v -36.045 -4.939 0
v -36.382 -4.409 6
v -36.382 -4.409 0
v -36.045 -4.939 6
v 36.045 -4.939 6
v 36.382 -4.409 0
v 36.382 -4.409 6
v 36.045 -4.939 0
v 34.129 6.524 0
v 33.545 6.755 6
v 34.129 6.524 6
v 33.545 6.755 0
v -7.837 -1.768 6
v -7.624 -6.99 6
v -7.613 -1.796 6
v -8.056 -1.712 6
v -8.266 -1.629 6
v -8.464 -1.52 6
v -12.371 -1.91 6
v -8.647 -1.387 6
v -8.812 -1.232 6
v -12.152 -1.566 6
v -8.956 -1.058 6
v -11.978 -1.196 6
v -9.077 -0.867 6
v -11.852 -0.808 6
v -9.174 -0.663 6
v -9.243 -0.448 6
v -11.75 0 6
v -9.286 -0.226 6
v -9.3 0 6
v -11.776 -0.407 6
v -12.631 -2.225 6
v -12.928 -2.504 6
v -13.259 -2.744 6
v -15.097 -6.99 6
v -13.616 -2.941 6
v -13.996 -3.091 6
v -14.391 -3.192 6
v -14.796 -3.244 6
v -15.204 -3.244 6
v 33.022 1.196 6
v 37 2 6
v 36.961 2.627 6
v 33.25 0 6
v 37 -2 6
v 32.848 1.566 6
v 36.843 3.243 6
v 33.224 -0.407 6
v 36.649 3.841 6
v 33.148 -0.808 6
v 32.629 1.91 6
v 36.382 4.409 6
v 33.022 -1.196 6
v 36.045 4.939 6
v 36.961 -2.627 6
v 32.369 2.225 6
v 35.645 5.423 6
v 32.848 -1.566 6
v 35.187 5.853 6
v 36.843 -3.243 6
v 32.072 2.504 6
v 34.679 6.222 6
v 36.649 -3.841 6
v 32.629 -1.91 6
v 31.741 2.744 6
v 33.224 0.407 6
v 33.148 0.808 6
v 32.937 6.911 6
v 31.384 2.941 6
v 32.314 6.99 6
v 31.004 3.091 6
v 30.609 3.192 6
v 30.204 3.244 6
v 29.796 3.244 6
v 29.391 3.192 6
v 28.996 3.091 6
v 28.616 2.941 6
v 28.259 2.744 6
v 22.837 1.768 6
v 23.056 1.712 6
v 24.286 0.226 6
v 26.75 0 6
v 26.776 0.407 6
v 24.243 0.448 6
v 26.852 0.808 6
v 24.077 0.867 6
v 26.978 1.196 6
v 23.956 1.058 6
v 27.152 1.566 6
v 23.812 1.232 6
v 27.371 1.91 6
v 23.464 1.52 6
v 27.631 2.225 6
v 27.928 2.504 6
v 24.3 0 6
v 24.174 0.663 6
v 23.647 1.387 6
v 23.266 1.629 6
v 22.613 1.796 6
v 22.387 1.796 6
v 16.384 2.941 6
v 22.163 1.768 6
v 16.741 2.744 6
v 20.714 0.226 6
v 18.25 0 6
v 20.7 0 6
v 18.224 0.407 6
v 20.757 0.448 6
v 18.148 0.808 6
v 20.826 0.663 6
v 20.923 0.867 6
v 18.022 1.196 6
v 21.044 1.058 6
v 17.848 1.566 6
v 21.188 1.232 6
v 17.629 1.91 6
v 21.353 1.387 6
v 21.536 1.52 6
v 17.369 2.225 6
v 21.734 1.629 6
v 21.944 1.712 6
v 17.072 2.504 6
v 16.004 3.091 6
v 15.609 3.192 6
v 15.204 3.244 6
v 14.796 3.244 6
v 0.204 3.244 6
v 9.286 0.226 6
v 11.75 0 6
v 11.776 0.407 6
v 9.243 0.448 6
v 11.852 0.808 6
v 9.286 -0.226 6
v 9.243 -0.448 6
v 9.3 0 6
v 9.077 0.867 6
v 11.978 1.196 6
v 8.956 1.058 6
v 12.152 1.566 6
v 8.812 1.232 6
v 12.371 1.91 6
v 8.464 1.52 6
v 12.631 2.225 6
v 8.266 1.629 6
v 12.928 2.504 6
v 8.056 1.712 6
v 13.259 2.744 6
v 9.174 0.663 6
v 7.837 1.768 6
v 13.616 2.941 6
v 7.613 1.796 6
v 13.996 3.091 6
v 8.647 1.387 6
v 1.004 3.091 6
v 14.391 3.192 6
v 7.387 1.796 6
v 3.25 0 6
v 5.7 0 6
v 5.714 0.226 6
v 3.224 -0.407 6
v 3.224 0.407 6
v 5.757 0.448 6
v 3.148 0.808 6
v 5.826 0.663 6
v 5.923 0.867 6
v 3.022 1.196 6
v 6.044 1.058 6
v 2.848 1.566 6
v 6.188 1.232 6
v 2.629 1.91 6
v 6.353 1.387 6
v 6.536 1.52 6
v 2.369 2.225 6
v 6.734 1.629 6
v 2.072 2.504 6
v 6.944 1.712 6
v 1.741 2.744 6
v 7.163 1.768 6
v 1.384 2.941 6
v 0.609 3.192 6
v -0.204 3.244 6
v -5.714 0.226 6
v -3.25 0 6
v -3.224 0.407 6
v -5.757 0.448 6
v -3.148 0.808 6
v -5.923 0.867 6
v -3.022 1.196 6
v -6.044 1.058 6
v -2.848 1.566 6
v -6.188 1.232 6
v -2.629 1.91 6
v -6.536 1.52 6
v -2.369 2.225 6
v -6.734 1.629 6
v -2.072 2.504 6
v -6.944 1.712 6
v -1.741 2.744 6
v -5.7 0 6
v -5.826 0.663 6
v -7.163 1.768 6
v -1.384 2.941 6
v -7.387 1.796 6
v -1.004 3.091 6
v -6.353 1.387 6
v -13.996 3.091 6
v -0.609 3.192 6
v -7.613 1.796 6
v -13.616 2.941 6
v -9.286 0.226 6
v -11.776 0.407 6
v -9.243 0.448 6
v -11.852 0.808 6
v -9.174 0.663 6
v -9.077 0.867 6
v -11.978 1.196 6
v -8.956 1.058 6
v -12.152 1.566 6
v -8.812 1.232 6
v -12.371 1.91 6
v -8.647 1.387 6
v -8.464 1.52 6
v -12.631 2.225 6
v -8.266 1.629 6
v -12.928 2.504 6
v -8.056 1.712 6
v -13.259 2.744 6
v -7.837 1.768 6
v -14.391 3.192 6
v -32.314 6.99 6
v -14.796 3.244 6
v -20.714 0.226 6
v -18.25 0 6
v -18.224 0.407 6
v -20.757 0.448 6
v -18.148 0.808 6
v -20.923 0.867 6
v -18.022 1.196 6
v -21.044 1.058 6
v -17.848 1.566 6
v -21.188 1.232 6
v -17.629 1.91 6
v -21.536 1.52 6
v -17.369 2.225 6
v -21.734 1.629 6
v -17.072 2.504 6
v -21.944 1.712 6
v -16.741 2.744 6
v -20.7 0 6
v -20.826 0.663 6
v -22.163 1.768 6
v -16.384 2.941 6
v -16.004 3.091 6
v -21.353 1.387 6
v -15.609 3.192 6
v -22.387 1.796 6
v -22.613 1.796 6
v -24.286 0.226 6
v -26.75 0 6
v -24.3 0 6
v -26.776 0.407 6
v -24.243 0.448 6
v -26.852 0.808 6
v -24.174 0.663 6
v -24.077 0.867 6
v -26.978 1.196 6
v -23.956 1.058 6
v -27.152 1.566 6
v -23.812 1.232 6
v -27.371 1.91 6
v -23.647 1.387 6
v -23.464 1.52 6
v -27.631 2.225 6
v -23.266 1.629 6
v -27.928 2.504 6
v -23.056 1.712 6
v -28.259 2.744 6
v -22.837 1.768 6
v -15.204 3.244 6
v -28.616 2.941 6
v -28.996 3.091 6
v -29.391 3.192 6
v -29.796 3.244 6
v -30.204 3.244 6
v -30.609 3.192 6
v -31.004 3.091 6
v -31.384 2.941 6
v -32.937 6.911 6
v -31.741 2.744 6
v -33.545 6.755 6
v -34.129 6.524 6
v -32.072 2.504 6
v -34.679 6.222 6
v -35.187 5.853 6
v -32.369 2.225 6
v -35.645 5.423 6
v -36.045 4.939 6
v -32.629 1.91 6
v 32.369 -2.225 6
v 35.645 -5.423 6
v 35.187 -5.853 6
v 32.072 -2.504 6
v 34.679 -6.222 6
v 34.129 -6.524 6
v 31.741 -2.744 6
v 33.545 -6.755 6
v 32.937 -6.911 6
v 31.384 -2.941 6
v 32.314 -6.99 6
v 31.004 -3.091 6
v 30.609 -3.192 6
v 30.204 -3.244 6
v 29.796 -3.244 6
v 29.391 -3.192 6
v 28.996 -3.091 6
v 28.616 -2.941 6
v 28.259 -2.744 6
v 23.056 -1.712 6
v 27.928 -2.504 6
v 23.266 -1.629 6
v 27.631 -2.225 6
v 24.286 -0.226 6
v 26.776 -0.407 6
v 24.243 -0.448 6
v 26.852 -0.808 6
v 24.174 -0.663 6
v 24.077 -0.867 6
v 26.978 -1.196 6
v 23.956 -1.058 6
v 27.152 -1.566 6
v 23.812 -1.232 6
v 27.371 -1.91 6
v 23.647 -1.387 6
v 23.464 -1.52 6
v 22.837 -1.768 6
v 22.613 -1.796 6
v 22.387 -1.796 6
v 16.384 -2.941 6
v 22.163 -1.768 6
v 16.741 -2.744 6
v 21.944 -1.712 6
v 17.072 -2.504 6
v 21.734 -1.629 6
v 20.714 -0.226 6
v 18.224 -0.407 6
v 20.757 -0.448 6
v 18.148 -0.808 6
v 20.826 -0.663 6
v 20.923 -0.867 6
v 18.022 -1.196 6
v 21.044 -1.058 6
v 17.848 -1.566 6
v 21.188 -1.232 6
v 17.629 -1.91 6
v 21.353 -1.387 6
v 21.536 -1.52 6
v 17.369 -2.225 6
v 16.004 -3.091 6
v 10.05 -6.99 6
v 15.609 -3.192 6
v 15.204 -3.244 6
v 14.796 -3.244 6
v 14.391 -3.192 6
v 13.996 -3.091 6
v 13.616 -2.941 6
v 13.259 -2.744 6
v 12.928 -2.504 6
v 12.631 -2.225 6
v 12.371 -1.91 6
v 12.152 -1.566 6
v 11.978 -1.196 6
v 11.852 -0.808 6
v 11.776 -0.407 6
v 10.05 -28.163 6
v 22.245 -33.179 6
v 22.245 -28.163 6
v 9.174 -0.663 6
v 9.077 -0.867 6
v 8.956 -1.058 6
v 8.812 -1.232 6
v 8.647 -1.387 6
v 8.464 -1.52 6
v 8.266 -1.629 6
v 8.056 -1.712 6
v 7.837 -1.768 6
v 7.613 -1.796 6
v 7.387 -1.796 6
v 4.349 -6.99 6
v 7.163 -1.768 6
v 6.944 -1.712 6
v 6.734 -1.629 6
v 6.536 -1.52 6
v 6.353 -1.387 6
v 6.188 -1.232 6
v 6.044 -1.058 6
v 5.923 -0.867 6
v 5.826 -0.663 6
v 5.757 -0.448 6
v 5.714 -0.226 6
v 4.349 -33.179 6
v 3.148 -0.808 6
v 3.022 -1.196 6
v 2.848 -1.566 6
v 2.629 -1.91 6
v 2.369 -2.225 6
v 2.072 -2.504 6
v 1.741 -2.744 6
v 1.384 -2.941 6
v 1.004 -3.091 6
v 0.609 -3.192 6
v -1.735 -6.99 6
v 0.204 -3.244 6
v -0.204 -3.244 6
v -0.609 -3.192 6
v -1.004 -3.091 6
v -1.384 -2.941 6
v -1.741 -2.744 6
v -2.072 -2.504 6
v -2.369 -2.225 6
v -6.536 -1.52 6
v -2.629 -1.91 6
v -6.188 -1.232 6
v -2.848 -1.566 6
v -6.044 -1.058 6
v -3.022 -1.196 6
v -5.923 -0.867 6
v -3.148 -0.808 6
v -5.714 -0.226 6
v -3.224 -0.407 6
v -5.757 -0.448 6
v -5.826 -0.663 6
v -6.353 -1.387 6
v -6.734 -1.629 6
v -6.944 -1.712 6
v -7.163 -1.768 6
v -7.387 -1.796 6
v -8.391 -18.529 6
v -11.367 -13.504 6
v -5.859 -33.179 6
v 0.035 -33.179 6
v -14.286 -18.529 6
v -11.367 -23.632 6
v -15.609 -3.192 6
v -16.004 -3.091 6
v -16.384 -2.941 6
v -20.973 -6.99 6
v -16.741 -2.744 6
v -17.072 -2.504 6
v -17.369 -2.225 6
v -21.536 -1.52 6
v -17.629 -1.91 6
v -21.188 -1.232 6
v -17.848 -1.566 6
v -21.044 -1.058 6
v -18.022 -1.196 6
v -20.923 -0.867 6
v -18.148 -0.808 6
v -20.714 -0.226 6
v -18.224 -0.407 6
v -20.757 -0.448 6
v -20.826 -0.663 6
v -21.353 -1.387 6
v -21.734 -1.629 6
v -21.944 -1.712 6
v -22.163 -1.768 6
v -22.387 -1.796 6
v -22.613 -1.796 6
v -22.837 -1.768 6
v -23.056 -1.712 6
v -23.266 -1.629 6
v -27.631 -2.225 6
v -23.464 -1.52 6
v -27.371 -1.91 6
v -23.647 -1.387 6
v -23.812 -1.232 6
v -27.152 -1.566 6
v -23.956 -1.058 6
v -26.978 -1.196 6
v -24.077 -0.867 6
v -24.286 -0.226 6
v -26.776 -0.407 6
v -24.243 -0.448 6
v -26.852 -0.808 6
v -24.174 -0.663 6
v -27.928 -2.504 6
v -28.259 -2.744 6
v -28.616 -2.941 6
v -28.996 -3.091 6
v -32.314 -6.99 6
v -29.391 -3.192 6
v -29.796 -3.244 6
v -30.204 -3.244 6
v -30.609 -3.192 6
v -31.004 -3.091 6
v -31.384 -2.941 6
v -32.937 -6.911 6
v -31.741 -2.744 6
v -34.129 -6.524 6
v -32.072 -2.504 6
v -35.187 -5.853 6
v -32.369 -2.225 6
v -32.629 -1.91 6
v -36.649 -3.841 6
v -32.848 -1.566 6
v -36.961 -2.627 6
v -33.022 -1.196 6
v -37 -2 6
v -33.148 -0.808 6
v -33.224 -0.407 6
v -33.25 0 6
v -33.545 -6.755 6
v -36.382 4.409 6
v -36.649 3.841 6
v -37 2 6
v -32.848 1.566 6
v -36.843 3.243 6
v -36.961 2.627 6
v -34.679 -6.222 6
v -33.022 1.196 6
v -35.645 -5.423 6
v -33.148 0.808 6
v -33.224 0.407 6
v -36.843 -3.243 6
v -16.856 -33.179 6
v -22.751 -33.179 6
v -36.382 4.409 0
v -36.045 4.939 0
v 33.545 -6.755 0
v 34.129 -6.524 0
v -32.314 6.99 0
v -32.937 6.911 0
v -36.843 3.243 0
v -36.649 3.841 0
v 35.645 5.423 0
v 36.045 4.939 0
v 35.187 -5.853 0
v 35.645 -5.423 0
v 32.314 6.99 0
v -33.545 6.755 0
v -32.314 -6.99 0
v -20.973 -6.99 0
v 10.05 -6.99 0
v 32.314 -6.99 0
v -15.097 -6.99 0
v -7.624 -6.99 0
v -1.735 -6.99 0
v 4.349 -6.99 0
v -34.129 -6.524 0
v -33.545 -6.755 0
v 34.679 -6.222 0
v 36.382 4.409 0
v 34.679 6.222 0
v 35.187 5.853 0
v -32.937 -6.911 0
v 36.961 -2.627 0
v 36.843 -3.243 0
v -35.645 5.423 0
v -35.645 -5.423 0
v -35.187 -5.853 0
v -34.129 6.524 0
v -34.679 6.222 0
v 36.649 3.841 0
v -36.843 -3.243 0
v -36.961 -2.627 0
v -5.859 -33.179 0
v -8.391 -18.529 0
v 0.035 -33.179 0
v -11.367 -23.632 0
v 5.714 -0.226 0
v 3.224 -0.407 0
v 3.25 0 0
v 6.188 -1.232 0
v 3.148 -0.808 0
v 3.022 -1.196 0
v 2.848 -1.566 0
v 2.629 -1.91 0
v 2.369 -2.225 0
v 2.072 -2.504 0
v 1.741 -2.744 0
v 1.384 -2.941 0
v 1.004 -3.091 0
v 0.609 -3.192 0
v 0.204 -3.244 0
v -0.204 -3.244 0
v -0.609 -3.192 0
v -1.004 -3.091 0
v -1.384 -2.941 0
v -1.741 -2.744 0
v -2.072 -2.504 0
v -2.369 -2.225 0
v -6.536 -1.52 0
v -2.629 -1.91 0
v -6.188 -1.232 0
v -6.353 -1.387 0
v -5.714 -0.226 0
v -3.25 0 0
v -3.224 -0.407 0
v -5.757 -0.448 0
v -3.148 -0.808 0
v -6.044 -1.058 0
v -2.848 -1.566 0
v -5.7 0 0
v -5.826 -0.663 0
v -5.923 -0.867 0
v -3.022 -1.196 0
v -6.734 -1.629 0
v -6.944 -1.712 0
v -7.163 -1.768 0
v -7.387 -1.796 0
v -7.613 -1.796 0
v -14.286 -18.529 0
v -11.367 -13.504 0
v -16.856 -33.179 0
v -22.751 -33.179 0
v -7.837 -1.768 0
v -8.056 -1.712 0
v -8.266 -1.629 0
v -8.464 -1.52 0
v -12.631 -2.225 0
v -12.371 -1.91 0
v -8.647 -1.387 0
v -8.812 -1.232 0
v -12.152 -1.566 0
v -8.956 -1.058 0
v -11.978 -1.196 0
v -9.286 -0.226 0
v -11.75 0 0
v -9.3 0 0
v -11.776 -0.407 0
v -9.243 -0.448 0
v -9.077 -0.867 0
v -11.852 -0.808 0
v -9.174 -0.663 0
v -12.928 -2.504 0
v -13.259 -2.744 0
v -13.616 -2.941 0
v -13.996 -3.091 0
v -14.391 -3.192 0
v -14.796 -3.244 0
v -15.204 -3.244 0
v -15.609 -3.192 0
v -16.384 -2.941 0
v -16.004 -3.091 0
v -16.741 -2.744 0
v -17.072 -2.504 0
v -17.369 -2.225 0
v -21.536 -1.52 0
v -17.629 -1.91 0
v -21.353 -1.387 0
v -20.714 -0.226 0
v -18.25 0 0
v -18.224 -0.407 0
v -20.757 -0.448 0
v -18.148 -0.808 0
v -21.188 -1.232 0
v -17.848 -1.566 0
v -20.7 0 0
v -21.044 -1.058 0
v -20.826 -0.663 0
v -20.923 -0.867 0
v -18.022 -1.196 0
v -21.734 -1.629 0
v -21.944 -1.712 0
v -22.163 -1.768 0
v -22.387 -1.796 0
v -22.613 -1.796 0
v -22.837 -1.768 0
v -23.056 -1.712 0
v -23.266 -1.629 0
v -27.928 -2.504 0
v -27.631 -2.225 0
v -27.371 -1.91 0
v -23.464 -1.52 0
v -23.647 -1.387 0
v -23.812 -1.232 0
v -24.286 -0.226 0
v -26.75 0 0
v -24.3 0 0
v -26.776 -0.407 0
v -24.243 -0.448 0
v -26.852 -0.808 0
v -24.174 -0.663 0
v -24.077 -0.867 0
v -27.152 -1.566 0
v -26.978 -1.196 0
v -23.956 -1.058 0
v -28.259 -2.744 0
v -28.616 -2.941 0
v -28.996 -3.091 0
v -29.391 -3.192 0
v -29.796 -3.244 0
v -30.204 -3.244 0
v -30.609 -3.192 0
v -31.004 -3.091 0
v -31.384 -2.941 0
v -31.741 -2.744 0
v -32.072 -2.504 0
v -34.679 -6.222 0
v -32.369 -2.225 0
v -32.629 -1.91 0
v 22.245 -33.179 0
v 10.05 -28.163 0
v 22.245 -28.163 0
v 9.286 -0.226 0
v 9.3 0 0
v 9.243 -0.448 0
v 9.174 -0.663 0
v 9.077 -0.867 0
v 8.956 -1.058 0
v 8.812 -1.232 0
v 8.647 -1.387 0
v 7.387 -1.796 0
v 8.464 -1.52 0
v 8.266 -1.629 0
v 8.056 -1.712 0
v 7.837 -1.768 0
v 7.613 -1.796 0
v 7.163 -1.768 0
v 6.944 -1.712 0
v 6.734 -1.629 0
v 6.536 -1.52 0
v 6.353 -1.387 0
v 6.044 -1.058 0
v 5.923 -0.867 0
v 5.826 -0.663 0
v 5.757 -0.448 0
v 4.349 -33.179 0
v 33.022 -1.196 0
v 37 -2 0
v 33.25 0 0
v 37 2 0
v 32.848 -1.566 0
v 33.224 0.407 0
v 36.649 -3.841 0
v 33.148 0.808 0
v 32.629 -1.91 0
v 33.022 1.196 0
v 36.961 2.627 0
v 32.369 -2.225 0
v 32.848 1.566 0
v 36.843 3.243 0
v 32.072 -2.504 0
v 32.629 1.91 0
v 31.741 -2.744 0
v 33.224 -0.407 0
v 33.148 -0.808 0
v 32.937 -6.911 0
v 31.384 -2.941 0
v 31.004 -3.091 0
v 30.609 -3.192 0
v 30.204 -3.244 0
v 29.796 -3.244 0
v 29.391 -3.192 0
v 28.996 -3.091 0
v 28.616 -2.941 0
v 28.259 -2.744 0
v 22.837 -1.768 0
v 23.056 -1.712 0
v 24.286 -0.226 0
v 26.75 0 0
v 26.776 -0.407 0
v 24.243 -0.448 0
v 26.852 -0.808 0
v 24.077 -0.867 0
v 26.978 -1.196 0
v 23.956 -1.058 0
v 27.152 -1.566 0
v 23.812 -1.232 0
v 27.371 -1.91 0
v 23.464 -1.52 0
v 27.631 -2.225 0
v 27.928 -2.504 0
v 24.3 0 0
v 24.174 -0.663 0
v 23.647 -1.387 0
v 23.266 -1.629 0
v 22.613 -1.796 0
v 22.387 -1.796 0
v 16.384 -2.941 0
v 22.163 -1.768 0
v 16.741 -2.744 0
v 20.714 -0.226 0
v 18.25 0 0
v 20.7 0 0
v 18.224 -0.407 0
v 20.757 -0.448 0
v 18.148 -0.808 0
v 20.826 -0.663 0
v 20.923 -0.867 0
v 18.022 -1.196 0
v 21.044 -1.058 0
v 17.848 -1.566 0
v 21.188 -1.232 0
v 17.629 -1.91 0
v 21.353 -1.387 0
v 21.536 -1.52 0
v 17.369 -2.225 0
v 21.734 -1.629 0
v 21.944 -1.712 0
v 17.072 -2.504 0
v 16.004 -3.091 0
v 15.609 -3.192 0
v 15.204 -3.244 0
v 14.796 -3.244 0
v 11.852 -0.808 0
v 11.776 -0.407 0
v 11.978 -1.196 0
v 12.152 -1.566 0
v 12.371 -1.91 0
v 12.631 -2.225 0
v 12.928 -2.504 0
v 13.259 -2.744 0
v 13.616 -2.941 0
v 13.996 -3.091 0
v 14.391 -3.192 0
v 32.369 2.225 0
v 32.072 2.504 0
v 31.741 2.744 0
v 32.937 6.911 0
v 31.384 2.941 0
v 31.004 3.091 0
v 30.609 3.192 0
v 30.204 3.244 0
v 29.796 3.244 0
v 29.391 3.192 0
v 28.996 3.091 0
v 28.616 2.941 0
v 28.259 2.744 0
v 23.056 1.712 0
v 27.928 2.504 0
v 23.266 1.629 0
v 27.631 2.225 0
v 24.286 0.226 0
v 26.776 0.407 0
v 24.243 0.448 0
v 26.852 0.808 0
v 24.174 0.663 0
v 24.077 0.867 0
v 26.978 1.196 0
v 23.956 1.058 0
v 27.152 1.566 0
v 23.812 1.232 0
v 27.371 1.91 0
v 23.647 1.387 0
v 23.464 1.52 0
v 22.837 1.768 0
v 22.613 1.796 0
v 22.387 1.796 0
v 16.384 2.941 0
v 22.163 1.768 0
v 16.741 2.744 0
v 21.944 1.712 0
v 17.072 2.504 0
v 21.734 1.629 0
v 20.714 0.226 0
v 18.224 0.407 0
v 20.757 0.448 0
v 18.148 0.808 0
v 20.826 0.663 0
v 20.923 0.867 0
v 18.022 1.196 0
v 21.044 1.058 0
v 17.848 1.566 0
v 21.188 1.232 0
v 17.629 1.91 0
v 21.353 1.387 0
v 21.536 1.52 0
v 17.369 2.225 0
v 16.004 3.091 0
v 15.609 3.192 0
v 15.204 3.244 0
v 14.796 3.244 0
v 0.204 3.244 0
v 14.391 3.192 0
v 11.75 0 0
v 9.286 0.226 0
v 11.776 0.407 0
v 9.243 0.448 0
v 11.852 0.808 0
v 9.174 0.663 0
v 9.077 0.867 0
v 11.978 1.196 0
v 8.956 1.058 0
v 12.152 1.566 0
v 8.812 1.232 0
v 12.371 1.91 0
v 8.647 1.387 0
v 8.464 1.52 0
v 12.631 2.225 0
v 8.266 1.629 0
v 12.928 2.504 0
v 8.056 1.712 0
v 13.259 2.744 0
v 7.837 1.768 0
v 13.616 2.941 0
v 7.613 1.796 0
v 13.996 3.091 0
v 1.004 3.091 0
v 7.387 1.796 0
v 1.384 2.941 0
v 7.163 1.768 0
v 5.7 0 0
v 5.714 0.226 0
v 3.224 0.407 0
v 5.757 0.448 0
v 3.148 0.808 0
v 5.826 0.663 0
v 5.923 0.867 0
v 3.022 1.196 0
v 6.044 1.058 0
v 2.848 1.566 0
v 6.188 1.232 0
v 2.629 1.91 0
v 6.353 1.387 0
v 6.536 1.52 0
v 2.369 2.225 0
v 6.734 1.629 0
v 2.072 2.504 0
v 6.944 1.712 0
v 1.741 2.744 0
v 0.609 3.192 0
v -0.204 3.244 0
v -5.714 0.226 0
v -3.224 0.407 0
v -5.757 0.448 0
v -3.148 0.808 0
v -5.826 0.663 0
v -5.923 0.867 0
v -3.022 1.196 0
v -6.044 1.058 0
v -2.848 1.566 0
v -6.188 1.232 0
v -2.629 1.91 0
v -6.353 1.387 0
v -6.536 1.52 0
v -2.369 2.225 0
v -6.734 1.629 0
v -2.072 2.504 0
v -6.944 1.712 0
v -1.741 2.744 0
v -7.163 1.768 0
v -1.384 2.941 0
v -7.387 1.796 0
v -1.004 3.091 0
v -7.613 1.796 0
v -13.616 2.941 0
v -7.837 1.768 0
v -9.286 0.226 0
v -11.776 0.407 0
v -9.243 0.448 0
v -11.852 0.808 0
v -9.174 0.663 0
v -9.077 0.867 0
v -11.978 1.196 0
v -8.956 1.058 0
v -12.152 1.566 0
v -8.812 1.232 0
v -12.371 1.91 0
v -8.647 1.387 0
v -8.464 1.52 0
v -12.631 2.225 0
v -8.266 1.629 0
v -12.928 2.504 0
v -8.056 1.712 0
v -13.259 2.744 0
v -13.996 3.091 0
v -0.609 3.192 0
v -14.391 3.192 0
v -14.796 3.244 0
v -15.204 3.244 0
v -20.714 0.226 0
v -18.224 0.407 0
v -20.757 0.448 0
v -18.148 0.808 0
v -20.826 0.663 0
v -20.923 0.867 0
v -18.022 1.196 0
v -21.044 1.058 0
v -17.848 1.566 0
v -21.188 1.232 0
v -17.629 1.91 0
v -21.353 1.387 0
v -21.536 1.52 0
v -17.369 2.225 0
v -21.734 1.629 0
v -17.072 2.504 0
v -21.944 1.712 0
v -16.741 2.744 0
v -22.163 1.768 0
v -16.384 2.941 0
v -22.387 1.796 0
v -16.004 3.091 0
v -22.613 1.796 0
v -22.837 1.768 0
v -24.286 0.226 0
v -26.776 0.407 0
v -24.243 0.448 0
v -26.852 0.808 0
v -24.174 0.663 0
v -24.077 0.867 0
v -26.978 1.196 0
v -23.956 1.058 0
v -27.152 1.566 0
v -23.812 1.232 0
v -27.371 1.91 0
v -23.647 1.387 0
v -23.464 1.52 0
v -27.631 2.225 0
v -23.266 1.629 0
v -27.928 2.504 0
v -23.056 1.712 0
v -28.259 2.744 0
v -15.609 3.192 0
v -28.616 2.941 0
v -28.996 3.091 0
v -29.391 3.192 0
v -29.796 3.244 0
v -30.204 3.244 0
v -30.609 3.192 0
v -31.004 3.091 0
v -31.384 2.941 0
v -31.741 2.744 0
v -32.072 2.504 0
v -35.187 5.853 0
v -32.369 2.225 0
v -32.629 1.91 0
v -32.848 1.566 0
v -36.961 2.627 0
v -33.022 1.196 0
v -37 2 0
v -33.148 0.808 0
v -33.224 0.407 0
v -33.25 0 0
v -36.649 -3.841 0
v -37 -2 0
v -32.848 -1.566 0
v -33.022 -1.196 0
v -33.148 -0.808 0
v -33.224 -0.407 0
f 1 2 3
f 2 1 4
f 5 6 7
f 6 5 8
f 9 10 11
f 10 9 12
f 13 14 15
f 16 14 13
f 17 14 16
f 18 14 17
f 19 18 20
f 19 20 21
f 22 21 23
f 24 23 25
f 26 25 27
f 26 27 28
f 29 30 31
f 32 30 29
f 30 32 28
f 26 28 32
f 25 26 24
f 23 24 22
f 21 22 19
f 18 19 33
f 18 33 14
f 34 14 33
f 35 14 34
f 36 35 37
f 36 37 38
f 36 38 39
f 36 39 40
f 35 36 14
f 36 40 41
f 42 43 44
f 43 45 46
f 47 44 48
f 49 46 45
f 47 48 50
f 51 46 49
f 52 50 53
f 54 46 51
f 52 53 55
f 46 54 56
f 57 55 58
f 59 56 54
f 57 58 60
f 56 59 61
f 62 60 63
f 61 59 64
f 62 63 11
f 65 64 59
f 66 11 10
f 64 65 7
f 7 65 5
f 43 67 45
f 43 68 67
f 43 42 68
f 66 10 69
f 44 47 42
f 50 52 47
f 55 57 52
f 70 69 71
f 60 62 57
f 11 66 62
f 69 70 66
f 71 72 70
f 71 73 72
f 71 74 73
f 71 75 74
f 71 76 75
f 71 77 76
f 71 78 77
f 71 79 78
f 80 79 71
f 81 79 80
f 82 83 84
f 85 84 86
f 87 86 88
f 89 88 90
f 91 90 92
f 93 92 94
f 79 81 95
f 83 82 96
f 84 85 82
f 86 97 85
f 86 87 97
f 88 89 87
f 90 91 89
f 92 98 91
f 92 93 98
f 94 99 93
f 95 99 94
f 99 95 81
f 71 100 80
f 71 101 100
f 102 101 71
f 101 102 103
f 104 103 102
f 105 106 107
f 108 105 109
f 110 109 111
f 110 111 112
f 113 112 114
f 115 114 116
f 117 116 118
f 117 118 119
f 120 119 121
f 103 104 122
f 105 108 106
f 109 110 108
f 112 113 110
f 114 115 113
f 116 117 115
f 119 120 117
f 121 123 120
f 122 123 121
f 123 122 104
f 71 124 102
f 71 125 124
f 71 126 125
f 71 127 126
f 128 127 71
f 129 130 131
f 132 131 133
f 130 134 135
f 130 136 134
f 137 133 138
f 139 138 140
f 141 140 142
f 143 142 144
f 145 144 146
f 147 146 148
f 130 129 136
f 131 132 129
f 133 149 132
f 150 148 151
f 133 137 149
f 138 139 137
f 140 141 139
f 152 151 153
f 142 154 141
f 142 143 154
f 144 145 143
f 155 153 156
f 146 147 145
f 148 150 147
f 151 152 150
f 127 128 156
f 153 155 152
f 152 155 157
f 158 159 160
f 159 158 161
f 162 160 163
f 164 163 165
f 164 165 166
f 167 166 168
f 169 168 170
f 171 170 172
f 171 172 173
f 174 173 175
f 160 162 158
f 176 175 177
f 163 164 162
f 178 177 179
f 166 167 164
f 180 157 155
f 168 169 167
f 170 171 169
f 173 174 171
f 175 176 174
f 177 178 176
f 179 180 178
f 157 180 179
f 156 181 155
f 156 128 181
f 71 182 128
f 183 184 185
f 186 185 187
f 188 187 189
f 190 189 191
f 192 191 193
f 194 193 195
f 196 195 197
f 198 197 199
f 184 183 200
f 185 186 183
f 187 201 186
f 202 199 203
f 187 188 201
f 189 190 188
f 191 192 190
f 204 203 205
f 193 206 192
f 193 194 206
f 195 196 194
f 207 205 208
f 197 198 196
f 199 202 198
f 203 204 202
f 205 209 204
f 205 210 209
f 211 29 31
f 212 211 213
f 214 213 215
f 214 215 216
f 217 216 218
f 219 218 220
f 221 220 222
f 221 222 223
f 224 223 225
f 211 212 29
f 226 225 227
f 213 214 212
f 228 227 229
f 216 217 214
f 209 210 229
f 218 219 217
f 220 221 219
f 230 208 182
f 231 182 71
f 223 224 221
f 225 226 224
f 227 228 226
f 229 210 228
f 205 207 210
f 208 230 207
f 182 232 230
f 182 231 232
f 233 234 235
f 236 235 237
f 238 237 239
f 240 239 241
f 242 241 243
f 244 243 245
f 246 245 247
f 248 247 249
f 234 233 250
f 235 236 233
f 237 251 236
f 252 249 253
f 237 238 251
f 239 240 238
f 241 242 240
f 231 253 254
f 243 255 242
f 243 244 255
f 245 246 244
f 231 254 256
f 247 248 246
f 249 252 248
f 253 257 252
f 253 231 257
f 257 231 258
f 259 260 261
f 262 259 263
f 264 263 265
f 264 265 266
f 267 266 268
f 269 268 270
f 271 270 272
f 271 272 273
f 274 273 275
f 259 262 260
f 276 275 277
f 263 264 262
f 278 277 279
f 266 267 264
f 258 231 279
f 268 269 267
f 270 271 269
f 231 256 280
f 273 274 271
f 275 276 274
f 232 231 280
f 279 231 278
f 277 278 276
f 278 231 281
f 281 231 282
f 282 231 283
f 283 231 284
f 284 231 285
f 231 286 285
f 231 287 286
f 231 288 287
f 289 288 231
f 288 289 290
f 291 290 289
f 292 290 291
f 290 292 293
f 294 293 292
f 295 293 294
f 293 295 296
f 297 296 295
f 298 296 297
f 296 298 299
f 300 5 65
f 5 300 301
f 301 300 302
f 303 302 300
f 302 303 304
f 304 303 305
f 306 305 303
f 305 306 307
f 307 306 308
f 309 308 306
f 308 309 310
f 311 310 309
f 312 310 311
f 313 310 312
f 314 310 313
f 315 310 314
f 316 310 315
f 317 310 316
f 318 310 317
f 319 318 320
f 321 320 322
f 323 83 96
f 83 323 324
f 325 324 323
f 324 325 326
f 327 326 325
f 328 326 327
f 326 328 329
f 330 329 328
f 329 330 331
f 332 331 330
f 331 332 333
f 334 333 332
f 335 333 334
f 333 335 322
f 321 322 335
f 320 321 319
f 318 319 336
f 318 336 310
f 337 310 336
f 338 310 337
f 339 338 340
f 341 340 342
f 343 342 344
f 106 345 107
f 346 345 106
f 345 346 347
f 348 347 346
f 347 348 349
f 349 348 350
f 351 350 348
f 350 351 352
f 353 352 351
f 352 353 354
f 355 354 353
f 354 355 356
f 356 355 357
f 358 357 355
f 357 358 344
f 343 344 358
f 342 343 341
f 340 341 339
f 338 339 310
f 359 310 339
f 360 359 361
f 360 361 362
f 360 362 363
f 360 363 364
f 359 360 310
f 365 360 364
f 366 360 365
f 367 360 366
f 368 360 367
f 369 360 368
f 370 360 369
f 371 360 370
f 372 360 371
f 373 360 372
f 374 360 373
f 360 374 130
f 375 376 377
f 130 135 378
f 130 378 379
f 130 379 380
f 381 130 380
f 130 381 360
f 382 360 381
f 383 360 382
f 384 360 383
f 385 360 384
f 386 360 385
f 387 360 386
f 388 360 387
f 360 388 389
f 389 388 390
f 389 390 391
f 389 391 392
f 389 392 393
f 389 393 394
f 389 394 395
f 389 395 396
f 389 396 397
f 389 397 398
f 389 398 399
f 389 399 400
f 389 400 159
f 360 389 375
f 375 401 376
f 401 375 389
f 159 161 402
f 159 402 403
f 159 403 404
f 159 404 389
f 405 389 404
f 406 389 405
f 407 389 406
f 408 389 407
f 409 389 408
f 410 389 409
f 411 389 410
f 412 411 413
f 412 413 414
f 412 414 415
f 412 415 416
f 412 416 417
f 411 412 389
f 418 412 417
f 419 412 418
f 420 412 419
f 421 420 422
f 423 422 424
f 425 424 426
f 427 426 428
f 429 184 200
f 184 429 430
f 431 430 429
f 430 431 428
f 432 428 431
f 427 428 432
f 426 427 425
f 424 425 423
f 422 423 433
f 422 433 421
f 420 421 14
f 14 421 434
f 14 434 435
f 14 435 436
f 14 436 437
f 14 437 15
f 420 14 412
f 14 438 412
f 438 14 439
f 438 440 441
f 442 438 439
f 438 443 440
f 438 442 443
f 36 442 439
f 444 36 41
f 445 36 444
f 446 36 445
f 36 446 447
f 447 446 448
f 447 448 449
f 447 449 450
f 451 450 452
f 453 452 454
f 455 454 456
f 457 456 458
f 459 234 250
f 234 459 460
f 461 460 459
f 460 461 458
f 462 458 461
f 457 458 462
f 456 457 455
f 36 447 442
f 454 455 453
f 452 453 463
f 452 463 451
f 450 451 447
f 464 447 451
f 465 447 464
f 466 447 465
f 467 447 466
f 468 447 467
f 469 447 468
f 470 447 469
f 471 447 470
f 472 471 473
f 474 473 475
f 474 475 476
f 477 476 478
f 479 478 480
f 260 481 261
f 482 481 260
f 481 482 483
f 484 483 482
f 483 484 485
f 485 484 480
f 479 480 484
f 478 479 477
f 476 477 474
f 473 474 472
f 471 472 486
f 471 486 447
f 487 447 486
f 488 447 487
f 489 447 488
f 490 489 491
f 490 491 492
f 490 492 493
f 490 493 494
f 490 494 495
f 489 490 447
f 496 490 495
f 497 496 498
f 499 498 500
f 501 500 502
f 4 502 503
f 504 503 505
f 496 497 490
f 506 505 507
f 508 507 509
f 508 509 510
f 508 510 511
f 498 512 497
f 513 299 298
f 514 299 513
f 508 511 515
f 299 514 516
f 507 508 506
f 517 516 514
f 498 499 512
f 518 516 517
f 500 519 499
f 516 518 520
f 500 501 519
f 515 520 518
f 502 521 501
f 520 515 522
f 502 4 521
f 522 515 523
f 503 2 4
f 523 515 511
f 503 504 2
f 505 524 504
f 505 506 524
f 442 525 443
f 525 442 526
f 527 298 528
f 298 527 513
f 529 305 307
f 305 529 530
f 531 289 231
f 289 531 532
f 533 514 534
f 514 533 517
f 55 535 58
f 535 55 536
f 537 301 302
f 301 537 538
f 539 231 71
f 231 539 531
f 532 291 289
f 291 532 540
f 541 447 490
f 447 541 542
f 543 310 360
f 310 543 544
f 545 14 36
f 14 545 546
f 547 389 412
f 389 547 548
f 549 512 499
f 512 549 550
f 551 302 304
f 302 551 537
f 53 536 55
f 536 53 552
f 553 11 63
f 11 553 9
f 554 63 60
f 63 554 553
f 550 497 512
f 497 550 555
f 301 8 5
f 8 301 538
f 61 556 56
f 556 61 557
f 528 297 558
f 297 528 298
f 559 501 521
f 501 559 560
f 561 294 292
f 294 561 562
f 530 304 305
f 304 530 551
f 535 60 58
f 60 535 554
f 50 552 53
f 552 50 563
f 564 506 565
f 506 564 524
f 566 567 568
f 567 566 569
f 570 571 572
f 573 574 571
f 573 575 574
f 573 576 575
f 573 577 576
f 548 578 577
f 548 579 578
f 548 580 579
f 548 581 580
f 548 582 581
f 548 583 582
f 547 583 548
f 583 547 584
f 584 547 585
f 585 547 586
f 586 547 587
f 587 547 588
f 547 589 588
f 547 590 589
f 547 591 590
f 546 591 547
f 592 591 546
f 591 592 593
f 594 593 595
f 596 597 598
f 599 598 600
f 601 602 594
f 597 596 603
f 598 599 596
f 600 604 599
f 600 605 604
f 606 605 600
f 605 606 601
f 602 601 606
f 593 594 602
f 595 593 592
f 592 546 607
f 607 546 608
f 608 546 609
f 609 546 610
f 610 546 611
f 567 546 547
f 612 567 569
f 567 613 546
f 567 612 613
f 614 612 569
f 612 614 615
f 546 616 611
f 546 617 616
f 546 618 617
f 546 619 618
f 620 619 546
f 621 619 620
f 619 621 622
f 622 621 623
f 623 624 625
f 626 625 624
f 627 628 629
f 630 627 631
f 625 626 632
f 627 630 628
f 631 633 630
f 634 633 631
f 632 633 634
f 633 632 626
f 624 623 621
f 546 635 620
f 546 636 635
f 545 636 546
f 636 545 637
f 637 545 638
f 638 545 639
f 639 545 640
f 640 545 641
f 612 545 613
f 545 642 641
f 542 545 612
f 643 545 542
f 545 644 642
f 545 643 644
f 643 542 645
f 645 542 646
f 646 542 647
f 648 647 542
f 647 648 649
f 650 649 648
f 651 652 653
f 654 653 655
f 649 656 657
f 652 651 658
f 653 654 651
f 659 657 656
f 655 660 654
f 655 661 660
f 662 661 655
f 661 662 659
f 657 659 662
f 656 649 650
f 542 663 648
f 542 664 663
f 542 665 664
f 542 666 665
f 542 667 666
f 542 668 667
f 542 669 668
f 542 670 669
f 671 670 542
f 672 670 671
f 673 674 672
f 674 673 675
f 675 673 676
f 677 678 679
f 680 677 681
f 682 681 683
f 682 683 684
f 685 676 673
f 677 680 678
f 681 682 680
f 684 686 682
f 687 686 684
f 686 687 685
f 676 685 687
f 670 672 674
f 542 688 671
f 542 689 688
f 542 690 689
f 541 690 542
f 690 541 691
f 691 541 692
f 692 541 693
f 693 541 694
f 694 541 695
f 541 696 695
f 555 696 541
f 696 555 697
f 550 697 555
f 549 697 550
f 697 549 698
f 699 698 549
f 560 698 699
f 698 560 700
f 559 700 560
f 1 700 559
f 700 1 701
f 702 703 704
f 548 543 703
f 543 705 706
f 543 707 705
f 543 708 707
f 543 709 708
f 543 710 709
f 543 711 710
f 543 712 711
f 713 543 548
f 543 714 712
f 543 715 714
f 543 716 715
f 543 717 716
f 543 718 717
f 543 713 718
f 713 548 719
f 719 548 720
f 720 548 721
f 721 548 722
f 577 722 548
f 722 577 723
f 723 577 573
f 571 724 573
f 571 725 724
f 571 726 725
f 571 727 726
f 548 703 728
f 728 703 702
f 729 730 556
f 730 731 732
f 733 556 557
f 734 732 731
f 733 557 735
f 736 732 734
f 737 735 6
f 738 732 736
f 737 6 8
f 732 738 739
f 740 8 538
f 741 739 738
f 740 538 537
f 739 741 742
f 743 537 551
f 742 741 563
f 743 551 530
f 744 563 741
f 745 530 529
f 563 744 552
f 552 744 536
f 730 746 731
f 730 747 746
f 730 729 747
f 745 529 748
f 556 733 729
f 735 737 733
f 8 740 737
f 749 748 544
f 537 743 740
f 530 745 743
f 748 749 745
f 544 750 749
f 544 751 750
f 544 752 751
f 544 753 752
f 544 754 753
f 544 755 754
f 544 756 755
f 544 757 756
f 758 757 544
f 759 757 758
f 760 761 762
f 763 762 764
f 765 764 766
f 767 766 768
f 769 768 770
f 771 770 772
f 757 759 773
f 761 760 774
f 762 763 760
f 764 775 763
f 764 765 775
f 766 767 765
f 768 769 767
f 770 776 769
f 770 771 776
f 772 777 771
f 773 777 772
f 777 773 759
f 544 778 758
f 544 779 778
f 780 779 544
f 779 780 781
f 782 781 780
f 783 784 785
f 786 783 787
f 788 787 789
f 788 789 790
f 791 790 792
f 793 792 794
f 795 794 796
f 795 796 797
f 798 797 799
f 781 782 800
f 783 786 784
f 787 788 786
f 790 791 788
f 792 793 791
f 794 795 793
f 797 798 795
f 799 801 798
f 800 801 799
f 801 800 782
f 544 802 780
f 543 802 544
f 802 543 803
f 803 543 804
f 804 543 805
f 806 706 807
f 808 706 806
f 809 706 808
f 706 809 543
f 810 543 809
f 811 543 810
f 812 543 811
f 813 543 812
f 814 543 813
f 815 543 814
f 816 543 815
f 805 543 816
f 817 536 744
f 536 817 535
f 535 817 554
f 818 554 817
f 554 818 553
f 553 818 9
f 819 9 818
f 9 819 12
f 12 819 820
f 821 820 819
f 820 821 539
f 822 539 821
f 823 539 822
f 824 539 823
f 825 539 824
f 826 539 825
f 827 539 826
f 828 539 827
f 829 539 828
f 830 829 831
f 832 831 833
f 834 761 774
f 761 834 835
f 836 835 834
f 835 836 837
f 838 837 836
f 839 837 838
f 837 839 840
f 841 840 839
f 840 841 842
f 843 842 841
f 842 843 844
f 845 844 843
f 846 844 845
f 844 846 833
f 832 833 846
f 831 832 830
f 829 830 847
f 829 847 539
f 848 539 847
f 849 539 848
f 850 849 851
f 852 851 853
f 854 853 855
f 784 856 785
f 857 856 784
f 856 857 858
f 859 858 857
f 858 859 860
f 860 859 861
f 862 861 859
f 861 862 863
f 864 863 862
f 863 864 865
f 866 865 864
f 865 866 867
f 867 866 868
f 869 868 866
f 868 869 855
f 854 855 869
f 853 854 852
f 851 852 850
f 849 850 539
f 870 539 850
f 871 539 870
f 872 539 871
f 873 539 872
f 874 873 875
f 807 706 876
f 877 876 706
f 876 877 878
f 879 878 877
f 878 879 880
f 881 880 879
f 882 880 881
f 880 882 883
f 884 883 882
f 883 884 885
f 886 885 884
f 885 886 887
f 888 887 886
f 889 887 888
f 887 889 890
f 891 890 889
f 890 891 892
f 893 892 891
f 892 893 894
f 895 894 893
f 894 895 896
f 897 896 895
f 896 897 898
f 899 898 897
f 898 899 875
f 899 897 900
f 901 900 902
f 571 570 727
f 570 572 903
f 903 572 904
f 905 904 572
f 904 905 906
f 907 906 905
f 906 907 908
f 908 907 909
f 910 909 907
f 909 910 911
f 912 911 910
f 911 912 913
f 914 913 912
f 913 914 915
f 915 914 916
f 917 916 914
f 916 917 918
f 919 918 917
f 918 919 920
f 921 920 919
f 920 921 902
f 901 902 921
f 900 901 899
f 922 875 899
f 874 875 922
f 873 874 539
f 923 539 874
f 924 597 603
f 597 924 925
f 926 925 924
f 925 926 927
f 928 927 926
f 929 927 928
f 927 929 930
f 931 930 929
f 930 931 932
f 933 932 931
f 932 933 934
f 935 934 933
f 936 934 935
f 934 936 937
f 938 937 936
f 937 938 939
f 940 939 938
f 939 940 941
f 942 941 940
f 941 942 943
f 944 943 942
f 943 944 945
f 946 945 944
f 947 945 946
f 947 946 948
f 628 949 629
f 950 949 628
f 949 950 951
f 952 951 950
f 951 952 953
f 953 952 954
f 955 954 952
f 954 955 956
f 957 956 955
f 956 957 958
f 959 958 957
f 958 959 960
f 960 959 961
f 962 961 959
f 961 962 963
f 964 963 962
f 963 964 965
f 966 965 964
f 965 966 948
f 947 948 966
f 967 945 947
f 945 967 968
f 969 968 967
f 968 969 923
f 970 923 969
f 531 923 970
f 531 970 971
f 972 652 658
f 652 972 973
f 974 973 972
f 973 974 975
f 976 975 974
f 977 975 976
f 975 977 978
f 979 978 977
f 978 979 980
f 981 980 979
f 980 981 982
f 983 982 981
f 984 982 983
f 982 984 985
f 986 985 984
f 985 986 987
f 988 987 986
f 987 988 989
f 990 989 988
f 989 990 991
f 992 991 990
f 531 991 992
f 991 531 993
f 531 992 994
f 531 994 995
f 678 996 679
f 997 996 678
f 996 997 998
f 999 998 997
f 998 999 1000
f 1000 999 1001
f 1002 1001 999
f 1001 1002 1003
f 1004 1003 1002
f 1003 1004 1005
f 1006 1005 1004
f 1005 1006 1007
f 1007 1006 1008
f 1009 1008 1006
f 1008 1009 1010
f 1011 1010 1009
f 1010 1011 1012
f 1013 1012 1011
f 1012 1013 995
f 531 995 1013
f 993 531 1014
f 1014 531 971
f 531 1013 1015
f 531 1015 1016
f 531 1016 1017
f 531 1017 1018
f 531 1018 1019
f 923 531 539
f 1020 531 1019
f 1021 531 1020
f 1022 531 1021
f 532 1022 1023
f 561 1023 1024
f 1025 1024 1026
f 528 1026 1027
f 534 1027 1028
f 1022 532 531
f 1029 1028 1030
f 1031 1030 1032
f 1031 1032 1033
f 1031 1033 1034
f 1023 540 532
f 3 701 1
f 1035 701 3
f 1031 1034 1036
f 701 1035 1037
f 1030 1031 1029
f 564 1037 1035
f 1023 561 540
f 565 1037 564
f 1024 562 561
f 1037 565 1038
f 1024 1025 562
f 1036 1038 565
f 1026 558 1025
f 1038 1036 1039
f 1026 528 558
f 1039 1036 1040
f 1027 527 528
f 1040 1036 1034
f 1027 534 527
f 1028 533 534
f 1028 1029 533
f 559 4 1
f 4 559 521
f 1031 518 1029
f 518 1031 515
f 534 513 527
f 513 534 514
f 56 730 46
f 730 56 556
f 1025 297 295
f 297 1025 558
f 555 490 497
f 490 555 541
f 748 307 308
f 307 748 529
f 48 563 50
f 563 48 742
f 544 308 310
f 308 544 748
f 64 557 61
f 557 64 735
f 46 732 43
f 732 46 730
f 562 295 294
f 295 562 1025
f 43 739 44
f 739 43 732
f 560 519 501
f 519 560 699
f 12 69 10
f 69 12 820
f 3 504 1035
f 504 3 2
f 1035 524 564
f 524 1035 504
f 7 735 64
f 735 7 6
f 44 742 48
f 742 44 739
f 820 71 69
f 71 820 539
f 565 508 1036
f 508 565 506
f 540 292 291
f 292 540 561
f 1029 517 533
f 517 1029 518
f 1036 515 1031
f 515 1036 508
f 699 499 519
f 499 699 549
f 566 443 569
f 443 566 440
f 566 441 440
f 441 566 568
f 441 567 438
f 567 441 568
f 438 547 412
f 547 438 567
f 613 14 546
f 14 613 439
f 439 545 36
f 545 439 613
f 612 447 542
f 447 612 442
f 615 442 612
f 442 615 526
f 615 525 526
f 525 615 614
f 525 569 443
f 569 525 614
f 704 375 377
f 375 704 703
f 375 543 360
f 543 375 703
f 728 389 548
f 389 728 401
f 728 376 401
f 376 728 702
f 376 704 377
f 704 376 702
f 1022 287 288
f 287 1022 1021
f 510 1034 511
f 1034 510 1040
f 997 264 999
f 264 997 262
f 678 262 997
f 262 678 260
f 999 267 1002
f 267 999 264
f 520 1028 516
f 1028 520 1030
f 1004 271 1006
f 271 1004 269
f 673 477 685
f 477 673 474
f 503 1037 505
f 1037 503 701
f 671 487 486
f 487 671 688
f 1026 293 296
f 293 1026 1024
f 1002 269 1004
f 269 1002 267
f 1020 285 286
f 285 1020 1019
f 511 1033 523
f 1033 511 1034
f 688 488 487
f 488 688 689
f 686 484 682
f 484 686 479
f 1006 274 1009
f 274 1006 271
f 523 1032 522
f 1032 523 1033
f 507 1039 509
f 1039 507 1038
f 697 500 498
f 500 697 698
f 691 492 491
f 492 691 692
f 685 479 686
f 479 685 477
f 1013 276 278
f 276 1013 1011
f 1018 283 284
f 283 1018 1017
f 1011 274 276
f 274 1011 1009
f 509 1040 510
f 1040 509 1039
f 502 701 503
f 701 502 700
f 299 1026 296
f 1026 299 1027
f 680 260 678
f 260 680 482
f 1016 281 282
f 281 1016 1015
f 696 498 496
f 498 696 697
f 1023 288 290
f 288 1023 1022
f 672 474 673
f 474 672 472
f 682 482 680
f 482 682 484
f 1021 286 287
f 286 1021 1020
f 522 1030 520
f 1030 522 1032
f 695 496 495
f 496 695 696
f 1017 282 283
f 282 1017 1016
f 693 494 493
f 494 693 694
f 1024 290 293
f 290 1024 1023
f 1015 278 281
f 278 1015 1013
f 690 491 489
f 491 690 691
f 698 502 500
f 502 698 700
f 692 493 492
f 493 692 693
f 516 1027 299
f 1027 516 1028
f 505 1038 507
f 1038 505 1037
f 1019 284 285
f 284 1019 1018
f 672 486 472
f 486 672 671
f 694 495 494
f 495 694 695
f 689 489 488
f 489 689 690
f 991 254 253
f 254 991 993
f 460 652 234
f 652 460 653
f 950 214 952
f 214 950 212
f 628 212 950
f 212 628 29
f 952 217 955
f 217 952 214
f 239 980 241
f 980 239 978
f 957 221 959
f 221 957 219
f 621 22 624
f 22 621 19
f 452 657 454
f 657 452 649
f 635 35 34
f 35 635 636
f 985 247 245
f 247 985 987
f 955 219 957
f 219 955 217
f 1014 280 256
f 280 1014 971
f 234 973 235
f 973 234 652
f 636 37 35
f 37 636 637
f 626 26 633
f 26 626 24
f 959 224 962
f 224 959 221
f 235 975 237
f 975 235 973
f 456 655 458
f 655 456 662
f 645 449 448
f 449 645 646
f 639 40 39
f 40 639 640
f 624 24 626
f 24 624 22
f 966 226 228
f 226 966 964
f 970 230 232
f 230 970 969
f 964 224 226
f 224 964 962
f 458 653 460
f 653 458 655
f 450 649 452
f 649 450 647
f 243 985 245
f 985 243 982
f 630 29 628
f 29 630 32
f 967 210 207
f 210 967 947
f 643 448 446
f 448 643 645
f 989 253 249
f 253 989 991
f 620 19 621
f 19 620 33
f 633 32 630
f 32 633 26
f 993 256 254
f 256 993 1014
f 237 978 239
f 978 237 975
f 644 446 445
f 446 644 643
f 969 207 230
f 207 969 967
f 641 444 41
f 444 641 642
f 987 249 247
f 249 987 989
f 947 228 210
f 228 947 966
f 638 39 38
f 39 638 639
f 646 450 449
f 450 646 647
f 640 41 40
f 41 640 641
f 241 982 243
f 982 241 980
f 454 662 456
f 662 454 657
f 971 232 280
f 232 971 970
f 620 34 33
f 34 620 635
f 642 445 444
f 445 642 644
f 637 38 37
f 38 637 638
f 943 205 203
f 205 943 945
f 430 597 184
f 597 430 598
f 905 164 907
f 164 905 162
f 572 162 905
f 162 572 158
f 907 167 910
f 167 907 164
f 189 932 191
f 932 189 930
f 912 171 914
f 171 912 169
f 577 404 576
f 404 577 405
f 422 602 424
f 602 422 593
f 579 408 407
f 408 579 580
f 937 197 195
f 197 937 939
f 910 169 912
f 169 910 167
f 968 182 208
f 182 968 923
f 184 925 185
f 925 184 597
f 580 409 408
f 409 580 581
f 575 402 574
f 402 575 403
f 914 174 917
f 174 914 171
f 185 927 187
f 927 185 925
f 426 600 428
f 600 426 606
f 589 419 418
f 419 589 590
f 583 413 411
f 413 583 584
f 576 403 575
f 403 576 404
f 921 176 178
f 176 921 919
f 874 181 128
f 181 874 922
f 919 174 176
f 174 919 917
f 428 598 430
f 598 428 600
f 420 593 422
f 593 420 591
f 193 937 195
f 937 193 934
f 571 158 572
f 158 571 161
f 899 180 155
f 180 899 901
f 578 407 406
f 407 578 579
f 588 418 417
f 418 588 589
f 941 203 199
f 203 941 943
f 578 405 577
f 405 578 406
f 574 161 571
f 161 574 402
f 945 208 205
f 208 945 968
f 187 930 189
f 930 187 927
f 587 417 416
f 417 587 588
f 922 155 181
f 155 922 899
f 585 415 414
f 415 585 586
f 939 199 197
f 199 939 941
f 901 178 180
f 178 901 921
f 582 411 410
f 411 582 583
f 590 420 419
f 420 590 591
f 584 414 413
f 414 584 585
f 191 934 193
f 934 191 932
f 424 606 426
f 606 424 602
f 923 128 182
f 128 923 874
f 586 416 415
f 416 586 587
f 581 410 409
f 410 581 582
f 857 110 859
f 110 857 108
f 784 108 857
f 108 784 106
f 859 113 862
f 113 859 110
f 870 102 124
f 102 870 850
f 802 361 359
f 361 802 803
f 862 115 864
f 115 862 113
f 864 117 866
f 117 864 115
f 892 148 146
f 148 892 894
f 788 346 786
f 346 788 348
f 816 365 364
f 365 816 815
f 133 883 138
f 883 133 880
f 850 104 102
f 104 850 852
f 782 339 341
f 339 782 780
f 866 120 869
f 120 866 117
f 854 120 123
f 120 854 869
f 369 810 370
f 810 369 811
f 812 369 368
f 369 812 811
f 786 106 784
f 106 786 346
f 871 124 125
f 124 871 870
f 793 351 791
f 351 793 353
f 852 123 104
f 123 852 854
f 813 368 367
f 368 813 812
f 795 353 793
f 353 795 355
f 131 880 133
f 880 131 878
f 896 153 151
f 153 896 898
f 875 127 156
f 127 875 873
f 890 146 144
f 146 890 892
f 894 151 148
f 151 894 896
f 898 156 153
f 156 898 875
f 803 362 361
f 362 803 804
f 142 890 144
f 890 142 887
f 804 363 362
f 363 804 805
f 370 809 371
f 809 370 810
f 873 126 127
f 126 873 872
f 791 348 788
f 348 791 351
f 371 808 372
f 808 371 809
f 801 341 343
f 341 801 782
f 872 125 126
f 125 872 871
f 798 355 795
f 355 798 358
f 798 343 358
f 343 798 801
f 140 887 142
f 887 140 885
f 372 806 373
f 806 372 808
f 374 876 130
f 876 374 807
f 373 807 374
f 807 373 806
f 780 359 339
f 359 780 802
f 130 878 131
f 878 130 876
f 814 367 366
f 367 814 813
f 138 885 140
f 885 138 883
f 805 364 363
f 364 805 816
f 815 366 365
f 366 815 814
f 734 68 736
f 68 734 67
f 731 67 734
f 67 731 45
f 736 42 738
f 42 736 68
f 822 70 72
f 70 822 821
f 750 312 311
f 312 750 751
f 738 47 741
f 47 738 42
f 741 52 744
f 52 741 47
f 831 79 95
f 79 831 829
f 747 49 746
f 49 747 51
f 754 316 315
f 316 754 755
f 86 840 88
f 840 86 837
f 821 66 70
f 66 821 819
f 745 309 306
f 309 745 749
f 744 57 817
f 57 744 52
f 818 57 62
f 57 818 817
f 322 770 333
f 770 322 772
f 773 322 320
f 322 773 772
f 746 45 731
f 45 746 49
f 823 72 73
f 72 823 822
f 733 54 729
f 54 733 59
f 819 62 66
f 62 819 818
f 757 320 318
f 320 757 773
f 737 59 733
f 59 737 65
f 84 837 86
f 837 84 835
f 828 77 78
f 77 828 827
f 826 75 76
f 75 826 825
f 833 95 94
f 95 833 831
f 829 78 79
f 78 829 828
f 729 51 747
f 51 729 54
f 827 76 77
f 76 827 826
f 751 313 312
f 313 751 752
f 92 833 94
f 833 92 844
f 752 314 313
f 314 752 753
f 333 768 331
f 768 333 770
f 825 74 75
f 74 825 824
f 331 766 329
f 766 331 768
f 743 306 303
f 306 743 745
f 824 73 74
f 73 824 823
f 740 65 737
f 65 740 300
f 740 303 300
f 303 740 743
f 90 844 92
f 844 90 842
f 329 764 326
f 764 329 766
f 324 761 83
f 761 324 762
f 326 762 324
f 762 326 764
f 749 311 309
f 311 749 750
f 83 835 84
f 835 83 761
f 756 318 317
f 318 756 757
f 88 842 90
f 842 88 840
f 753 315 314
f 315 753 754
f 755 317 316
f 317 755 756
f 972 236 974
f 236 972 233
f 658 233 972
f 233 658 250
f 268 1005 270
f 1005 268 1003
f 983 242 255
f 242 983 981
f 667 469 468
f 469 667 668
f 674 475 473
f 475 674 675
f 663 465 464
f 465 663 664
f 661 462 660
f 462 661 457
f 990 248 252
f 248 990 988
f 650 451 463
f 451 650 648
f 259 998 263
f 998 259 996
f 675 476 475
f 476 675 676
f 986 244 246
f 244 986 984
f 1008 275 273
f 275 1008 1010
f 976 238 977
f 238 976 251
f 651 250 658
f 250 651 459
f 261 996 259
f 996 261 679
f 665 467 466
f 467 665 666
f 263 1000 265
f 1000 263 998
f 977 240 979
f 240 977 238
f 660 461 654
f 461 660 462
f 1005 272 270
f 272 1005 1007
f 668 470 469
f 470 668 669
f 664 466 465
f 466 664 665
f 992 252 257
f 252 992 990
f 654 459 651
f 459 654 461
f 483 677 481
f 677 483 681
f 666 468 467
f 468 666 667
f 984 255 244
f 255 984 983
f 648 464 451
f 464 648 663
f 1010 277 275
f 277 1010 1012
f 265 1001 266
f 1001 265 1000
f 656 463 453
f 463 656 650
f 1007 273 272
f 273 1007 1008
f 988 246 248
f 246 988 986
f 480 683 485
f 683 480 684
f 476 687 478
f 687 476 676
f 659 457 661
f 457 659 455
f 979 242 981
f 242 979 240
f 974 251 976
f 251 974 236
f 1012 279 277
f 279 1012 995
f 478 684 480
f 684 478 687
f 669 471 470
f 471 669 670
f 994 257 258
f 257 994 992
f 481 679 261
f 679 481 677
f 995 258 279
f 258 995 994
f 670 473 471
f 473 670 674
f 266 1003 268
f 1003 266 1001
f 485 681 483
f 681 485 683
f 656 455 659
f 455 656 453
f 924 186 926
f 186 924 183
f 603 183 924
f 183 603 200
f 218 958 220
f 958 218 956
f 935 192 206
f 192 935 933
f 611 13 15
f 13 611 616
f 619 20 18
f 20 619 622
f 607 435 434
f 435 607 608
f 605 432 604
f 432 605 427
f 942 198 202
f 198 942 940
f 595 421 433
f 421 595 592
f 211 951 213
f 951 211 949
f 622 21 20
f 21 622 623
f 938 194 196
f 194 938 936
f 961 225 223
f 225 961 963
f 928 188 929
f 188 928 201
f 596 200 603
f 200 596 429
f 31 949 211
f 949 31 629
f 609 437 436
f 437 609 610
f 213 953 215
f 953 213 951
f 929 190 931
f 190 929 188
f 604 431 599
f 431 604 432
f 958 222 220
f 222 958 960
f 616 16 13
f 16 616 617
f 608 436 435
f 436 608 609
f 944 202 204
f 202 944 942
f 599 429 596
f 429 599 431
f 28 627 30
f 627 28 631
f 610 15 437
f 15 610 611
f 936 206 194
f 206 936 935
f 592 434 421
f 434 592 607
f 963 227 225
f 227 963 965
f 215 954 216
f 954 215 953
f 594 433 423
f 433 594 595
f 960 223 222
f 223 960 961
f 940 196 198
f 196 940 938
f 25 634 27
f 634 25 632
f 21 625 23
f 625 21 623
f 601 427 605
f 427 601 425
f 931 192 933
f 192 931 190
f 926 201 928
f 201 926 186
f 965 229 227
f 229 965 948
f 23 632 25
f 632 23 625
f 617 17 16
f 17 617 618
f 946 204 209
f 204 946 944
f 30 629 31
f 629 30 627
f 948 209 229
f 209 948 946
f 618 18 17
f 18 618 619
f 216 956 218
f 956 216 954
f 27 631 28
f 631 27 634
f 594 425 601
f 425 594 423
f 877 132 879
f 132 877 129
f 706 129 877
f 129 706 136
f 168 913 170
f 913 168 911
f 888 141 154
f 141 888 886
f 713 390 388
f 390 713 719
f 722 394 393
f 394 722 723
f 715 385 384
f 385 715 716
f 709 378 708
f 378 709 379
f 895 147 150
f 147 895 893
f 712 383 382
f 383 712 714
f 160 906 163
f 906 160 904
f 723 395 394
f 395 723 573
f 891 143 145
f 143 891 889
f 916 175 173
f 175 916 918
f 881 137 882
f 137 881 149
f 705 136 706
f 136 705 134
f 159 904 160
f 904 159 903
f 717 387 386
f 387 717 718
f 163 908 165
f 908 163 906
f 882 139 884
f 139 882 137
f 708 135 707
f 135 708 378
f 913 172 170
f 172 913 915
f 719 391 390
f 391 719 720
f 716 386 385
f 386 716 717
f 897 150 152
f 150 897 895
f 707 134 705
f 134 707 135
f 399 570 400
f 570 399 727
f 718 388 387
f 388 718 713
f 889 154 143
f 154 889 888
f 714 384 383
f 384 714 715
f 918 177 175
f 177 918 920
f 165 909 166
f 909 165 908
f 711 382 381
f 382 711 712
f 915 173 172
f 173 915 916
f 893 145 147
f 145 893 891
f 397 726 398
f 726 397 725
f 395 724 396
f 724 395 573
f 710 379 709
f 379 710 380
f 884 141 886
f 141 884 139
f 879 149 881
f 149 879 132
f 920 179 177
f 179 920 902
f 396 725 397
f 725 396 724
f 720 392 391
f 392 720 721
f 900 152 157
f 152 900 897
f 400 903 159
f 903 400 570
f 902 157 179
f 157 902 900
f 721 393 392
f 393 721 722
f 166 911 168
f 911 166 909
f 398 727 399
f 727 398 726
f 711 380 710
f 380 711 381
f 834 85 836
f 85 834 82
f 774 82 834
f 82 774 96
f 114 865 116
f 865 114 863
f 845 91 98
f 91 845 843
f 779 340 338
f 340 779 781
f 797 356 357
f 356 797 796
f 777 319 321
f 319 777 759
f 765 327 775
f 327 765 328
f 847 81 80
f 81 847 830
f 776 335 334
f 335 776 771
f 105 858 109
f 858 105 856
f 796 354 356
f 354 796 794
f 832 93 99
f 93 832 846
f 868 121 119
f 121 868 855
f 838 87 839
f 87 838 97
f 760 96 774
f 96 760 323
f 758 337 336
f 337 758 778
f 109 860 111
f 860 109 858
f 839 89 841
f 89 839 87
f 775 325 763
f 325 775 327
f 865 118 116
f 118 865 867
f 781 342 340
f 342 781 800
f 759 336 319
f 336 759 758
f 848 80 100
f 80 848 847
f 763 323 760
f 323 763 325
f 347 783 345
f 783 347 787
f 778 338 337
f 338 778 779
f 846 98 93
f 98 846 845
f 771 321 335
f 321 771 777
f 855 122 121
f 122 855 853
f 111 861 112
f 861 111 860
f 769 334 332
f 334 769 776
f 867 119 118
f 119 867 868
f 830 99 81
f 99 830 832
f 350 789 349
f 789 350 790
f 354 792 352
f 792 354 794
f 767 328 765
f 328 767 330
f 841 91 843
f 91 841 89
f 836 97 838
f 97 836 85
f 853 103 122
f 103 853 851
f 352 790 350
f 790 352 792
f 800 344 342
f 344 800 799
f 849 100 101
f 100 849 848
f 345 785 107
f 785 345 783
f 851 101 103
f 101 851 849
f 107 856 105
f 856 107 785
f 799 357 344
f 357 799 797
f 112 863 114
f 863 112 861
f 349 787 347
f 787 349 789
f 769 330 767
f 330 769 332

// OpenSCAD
$fn = 50;


difference() {
	union() {
		hull() {
			translate(v = [-32.0000000000, 2.0000000000, 0]) {
				cylinder(h = 6, r = 5);
			}
			translate(v = [32.0000000000, 2.0000000000, 0]) {
				cylinder(h = 6, r = 5);
			}
			translate(v = [-32.0000000000, -2.0000000000, 0]) {
				cylinder(h = 6, r = 5);
			}
			translate(v = [32.0000000000, -2.0000000000, 0]) {
				cylinder(h = 6, r = 5);
			}
		}
		translate(v = [0, -5, 0]) {
			linear_extrude(height = 6) {
				text(font = "DejaVu Sans Mono:style=Bold", halign = "center", size = 28.5000000000, text = "XL", valign = "top");
			}
		}
	}
	union() {
		translate(v = [-30.0000000000, 0.0000000000, 0]) {
			translate(v = [0, 0, -100]) {
				cylinder(h = 200, r = 3.2500000000);
			}
		}
		translate(v = [-15.0000000000, 0.0000000000, 0]) {
			translate(v = [0, 0, -100]) {
				cylinder(h = 200, r = 3.2500000000);
			}
		}
		translate(v = [0, 0, -100]) {
			cylinder(h = 200, r = 3.2500000000);
		}
		translate(v = [15.0000000000, 0.0000000000, 0]) {
			translate(v = [0, 0, -100]) {
				cylinder(h = 200, r = 3.2500000000);
			}
		}
		translate(v = [30.0000000000, 0.0000000000, 0]) {
			translate(v = [0, 0, -100]) {
				cylinder(h = 200, r = 3.2500000000);
			}
		}
		translate(v = [-30.0000000000, 0.0000000000, 0]) {
			translate(v = [0, 0, -100]) {
				cylinder(h = 200, r = 1.8000000000);
			}
		}
		translate(v = [-22.5000000000, 0.0000000000, 0]) {
			translate(v = [0, 0, -100]) {
				cylinder(h = 200, r = 1.8000000000);
			}
		}
		translate(v = [-15.0000000000, 0.0000000000, 0]) {
			translate(v = [0, 0, -100]) {
				cylinder(h = 200, r = 1.8000000000);
			}
		}
		translate(v = [-7.5000000000, 0.0000000000, 0]) {
			translate(v = [0, 0, -100]) {
				cylinder(h = 200, r = 1.8000000000);
			}
		}
		translate(v = [0, 0, -100]) {
			cylinder(h = 200, r = 1.8000000000);
		}
		translate(v = [7.5000000000, 0.0000000000, 0]) {
			translate(v = [0, 0, -100]) {
				cylinder(h = 200, r = 1.8000000000);
			}
		}
		translate(v = [15.0000000000, 0.0000000000, 0]) {
			translate(v = [0, 0, -100]) {
				cylinder(h = 200, r = 1.8000000000);
			}
		}
		translate(v = [22.5000000000, 0.0000000000, 0]) {
			translate(v = [0, 0, -100]) {
				cylinder(h = 200, r = 1.8000000000);
			}
		}
		translate(v = [30.0000000000, 0.0000000000, 0]) {
			translate(v = [0, 0, -100]) {
				cylinder(h = 200, r = 1.8000000000);
			}
		}
	}
}
